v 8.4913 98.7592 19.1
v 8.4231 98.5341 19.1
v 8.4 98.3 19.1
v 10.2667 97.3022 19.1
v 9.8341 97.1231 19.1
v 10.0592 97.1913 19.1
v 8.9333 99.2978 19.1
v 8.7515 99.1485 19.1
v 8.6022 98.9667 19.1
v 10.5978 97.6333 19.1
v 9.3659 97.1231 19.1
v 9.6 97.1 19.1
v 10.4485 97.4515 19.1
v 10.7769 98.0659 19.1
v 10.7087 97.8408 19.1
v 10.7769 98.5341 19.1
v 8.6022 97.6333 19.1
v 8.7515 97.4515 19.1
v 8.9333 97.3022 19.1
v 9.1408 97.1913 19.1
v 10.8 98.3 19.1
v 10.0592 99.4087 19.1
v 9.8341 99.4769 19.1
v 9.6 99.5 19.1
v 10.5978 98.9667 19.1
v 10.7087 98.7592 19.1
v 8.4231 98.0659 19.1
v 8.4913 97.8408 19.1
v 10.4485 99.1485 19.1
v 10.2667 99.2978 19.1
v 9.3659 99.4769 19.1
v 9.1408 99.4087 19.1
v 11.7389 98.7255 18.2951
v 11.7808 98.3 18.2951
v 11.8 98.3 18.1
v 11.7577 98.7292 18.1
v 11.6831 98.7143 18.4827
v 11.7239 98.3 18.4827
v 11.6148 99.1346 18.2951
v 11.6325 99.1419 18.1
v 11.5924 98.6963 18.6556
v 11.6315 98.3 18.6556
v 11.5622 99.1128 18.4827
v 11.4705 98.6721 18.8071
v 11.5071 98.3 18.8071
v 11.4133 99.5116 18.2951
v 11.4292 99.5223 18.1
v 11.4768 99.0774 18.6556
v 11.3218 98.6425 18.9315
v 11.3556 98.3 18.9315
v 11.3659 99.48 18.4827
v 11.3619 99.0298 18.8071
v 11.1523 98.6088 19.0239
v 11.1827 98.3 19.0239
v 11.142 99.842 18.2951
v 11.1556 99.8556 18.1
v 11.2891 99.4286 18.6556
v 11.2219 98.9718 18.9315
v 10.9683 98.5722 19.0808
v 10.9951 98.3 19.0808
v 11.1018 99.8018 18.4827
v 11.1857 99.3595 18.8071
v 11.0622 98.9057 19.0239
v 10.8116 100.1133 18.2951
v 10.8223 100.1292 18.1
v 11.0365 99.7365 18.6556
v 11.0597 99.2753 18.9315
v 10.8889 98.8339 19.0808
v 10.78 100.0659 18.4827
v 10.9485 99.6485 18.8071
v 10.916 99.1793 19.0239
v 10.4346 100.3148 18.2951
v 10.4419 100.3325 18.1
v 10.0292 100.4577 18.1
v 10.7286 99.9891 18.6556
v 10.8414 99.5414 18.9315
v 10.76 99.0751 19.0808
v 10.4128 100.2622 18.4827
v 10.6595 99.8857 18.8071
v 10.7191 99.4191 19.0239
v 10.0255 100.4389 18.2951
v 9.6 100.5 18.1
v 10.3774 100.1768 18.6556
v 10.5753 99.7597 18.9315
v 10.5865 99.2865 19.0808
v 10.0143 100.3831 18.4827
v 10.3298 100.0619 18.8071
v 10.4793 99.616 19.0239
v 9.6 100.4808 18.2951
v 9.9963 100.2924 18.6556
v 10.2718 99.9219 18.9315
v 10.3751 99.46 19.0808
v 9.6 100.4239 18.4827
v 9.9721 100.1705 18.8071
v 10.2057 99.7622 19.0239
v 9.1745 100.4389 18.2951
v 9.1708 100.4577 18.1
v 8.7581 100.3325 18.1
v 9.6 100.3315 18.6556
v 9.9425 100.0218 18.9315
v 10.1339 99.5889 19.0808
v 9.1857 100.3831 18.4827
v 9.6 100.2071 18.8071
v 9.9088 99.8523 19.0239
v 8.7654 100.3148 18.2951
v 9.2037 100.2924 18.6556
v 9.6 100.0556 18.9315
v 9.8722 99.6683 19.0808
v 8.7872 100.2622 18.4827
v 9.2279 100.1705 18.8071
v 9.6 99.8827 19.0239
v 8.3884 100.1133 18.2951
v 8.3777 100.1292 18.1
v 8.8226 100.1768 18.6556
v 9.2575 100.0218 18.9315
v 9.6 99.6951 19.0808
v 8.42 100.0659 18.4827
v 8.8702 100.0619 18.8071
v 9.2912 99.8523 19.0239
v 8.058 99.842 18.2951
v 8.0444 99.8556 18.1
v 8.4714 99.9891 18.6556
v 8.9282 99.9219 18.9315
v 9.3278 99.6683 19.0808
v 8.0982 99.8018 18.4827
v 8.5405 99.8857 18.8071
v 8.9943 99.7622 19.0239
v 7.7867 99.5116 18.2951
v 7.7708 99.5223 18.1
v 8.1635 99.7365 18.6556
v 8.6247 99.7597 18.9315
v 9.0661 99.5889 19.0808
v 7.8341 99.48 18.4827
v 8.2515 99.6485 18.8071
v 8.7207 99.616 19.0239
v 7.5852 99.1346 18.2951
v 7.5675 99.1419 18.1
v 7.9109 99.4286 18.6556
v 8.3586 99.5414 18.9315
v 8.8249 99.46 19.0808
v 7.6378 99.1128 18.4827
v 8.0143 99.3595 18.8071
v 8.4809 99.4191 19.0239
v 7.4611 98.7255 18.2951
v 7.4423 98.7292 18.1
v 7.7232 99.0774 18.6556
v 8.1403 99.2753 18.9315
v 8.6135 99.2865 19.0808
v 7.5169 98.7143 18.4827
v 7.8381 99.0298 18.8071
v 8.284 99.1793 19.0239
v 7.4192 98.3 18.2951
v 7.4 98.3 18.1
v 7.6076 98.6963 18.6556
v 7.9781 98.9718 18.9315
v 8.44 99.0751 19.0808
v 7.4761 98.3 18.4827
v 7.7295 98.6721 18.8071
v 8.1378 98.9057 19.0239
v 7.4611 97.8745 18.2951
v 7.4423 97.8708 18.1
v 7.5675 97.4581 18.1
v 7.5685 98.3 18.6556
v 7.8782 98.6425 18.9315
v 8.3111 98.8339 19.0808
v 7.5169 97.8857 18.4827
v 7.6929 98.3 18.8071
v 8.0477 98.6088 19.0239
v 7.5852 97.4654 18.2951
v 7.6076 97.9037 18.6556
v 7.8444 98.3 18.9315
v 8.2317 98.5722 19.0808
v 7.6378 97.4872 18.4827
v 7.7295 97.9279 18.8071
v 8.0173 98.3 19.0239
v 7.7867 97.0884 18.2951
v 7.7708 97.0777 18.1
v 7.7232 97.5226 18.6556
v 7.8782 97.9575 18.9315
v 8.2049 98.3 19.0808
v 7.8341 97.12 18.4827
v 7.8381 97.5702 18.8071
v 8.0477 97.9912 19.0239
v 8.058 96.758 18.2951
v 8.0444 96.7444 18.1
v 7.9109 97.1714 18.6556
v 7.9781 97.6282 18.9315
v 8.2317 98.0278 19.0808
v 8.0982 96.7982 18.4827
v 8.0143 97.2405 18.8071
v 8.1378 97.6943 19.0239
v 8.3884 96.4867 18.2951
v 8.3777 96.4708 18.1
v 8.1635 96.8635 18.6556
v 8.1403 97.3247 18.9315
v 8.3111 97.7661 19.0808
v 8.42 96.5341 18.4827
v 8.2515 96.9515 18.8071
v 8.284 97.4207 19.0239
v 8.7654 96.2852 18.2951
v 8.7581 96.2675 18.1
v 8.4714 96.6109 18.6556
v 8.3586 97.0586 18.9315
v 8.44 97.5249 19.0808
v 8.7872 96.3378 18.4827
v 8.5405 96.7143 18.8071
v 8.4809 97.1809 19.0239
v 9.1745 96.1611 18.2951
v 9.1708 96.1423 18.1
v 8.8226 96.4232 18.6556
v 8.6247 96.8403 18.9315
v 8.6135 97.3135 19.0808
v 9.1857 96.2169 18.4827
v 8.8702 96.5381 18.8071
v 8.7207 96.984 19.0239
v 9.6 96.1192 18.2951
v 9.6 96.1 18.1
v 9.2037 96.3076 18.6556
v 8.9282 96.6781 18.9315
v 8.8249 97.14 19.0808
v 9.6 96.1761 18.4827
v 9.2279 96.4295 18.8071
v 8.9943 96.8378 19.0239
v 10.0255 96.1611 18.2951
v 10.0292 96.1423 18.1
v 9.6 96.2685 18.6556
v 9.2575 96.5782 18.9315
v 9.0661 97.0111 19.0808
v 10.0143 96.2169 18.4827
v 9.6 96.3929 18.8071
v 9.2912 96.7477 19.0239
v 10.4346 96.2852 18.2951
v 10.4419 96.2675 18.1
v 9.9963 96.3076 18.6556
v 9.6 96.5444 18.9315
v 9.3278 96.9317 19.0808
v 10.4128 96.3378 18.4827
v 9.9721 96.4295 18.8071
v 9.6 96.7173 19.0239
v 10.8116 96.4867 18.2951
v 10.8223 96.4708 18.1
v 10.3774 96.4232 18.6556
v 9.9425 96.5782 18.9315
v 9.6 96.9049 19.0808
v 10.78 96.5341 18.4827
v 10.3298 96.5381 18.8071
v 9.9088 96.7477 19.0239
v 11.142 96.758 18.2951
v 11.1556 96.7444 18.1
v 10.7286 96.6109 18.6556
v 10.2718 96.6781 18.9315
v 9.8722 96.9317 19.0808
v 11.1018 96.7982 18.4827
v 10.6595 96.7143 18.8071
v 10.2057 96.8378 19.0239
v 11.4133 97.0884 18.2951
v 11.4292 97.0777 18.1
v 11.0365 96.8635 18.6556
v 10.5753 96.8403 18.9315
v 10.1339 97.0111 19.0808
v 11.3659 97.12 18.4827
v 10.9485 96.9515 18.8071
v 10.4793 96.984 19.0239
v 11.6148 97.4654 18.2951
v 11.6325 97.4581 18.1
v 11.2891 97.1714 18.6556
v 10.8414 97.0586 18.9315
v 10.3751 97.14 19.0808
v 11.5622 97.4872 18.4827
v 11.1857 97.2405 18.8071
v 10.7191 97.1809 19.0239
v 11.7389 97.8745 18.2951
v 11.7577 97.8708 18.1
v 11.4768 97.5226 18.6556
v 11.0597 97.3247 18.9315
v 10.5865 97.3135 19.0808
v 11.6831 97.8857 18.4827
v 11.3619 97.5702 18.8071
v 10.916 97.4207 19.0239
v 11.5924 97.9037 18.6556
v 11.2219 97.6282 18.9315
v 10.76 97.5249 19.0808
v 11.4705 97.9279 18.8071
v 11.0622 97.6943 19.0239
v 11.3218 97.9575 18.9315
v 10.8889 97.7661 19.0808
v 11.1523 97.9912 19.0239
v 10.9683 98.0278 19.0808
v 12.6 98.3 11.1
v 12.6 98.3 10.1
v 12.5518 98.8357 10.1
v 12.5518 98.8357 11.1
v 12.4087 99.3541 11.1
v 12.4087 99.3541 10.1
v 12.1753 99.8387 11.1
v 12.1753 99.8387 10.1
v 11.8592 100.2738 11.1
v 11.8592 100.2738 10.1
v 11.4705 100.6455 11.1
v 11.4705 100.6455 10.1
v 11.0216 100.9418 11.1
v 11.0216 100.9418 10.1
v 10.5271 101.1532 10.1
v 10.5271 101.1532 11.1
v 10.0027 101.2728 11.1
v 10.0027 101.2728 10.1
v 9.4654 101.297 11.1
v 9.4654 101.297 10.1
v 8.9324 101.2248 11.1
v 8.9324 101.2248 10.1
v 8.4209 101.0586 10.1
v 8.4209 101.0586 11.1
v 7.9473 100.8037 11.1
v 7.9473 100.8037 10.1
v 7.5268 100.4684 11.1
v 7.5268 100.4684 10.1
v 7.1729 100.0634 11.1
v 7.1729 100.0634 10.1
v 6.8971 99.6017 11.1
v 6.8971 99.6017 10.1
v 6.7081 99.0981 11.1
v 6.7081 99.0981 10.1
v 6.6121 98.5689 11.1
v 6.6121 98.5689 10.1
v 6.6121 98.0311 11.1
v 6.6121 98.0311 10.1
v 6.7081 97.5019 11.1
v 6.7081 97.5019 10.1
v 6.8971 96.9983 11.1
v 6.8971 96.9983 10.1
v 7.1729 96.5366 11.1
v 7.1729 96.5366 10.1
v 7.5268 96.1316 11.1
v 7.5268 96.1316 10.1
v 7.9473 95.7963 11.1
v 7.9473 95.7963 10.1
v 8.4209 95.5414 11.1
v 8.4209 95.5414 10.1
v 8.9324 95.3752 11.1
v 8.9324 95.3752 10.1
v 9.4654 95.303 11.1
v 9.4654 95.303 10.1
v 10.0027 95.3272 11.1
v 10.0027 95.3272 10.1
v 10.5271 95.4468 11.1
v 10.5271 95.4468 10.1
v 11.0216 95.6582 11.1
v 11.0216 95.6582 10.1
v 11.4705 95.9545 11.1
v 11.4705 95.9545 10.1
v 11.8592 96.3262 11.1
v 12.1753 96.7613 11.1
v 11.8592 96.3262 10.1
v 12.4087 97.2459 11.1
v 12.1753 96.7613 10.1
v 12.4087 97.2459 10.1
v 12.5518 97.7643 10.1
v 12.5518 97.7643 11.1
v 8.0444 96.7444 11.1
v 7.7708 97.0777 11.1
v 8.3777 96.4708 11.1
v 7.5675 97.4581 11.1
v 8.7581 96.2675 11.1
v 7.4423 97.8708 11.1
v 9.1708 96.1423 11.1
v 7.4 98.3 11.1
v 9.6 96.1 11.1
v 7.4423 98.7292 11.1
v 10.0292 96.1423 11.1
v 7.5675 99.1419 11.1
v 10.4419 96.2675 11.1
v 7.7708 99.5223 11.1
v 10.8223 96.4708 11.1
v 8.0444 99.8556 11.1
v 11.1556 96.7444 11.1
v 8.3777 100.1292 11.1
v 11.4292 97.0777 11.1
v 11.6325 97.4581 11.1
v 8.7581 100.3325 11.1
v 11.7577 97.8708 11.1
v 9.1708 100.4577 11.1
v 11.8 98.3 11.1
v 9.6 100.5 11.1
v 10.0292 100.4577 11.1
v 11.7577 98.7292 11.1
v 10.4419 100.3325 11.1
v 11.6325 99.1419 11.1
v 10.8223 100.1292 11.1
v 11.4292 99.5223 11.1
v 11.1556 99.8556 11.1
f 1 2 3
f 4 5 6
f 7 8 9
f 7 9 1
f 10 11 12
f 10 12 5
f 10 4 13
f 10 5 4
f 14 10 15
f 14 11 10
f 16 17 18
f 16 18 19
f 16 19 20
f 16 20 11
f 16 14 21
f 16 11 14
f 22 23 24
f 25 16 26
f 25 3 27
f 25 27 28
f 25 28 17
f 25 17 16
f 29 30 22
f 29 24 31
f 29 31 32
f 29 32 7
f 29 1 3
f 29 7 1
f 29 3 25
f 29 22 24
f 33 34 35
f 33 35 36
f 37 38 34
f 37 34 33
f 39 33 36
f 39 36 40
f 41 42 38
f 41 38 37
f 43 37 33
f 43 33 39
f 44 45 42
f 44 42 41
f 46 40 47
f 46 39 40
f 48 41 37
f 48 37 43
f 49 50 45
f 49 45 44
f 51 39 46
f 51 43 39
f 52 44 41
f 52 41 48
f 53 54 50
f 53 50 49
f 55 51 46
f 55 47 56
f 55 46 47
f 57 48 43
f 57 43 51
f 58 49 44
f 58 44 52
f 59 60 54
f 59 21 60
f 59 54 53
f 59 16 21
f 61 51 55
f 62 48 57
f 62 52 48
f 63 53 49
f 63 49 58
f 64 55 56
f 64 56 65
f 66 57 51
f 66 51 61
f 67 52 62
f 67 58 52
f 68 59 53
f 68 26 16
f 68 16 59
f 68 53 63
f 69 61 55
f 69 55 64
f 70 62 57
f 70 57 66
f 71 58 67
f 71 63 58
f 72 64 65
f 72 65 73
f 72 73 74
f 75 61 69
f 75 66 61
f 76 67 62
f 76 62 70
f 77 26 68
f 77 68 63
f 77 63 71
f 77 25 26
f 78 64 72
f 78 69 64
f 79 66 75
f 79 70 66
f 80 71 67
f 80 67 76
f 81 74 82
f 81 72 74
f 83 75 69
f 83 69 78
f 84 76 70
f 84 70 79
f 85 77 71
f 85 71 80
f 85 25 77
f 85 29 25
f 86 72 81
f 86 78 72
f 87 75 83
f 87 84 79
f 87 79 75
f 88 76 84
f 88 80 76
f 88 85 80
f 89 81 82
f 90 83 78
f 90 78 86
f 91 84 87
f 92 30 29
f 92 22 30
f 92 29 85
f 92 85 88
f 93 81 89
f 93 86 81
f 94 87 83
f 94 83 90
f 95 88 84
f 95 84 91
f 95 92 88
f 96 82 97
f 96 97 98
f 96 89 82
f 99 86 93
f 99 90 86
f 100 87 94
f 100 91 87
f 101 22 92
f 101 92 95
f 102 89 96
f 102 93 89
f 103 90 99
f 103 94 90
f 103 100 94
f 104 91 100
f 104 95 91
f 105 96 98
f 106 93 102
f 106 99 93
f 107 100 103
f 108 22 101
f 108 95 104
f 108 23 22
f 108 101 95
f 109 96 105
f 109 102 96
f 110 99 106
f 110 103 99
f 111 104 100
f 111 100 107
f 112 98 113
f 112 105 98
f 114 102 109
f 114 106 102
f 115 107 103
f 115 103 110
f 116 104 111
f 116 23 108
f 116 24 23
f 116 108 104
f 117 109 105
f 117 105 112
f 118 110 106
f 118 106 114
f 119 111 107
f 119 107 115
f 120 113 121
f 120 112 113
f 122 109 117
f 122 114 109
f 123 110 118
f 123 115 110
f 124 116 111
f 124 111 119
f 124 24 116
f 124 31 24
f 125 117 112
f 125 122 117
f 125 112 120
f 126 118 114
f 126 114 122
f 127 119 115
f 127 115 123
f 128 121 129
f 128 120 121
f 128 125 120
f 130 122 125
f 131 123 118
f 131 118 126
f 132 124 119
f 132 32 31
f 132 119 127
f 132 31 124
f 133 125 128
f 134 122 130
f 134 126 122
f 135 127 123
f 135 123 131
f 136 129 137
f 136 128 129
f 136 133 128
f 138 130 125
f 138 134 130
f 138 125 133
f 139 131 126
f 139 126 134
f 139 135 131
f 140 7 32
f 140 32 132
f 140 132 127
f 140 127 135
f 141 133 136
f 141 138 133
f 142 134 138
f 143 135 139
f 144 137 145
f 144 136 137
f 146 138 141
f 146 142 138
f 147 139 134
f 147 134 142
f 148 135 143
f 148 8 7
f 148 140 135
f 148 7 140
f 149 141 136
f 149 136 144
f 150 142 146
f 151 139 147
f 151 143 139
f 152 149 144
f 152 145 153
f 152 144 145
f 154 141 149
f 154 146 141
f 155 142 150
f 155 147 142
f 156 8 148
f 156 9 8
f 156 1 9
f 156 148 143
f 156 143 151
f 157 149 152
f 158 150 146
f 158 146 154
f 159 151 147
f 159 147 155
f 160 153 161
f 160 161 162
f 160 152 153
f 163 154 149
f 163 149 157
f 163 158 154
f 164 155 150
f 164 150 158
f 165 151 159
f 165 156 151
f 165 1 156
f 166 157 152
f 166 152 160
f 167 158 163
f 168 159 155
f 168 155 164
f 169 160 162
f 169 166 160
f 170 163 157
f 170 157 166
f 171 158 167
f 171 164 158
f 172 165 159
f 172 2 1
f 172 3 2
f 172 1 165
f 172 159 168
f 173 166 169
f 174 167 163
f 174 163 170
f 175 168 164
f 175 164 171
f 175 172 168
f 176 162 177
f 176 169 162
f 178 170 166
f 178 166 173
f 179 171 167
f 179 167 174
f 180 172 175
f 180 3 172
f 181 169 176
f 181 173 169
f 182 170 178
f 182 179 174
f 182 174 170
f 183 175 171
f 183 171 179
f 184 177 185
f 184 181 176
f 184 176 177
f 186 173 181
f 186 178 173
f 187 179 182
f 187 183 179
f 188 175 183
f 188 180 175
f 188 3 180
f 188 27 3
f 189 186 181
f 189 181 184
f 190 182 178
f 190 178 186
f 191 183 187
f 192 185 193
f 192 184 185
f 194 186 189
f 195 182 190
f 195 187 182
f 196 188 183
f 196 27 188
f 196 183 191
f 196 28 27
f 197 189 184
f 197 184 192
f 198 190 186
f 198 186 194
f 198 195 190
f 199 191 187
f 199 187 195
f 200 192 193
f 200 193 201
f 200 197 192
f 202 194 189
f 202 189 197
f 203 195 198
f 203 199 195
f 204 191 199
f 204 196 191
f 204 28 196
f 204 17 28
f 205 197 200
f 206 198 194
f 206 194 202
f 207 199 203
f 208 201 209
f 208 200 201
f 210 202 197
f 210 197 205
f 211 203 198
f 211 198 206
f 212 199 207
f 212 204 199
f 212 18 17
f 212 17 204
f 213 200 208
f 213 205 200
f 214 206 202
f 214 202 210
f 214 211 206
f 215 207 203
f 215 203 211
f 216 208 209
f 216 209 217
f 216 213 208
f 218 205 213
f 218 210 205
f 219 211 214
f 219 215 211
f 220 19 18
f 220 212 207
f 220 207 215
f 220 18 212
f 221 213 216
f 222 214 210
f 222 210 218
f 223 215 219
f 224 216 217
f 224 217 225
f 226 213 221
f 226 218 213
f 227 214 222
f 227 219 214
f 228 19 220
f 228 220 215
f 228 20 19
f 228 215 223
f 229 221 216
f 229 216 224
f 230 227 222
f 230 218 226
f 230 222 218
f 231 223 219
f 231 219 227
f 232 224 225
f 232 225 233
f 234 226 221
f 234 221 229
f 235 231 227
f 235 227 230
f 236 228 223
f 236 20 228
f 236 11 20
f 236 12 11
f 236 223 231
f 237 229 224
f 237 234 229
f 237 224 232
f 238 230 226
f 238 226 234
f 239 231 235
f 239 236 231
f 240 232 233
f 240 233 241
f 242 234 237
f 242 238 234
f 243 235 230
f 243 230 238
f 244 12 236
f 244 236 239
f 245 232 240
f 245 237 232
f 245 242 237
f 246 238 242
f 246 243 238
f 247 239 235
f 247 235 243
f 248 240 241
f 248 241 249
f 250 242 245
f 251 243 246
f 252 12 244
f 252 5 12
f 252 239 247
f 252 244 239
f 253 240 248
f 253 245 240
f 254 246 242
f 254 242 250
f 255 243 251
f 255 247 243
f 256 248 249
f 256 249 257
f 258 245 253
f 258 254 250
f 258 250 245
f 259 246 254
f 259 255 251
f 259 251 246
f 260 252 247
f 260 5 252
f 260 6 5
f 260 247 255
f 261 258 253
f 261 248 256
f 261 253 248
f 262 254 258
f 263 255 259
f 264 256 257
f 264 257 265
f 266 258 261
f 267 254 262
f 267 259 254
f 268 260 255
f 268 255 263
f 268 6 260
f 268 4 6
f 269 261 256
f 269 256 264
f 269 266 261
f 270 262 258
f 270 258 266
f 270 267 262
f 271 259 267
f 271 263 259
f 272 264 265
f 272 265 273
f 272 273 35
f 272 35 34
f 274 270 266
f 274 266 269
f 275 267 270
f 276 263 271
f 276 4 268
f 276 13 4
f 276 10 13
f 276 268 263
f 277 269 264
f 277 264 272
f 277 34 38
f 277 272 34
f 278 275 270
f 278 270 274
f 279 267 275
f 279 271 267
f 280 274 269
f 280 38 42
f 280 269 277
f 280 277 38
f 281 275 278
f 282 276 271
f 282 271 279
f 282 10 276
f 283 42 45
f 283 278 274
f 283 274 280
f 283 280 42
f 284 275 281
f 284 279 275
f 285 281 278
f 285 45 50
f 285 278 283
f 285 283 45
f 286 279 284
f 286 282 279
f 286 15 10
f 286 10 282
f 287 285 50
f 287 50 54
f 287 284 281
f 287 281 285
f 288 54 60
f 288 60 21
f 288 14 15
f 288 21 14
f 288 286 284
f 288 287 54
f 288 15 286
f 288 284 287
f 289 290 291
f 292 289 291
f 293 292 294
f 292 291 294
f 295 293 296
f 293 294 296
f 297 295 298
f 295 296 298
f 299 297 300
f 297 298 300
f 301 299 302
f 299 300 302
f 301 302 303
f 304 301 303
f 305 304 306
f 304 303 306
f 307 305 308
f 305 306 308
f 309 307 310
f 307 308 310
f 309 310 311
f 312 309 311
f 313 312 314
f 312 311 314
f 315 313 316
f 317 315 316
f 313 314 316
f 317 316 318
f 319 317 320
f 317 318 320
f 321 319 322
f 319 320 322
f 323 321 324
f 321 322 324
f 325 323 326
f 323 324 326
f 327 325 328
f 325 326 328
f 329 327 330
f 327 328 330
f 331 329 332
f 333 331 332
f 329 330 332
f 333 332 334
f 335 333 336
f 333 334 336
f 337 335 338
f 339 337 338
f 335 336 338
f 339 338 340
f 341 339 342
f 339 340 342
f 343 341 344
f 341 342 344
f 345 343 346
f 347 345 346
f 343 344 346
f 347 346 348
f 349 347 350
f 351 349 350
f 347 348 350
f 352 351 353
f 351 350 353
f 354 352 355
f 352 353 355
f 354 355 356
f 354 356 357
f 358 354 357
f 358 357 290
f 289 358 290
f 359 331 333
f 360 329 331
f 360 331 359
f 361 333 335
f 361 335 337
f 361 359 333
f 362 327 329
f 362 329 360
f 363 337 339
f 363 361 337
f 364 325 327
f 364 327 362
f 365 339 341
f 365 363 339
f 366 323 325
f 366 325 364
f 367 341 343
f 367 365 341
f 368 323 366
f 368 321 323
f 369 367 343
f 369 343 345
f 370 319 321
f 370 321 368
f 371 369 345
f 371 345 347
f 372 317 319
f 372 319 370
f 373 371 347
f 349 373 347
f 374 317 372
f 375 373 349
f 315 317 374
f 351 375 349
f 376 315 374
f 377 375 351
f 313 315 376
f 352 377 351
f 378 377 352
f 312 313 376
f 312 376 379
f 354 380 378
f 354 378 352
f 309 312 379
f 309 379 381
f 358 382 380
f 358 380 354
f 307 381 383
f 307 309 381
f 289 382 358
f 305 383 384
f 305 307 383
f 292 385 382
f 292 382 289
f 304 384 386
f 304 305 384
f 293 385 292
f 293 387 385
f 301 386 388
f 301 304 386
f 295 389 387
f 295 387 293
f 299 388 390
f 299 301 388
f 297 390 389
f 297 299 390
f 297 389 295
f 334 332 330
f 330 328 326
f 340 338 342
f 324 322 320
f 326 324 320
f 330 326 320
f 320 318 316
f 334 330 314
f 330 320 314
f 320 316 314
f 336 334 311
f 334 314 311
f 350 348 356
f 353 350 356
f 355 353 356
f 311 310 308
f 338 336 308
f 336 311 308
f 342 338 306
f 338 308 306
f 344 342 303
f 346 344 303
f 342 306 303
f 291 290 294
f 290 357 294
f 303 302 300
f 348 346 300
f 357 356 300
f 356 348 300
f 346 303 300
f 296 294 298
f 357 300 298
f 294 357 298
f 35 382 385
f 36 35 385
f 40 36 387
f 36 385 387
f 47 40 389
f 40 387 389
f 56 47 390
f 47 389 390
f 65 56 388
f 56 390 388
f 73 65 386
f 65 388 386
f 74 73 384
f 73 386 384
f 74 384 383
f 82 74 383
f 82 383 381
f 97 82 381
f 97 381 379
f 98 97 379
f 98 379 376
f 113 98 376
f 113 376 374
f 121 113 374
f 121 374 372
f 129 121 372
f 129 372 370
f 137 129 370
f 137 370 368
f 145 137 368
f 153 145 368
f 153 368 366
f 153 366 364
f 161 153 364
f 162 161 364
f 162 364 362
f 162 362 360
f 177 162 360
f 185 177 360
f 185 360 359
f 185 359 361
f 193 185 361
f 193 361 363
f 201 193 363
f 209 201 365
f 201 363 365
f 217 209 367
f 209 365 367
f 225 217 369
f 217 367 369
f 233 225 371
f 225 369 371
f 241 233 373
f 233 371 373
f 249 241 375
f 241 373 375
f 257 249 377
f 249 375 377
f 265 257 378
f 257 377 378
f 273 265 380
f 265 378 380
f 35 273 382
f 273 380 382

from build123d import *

# Parameters (mm, degrees)
CYLINDER019_R     = 2.2
CYLINDER019_DEPTH = 9
CYLINDER021_R     = 3
CYLINDER021_DEPTH = 1
FILLET_R          = 1


with BuildPart() as onoff_button_c:
    # Cylinder019 → Cylinder019 (new body)
    with BuildSketch(Plane(origin=(9.6, 98.3, 10.1), x_dir=(1, 0, 0), z_dir=(0, 0, 1))):
        Circle(CYLINDER019_R)
    extrude(amount=CYLINDER019_DEPTH)


with BuildPart() as onoff_button:
    # Cylinder021 → Cylinder021 (new body)
    with BuildSketch(Plane(origin=(9.6, 98.3, 10.1), x_dir=(1, 0, 0), z_dir=(0, 0, 1))):
        Circle(CYLINDER021_R)
    extrude(amount=CYLINDER021_DEPTH)

    # Fusion032: union onoff_button_c
    add(onoff_button_c.part)

    # Fillet
    fillet_edges = [onoff_button.edges().sort_by_distance(p)[0] for p in [
        (7.4, 98.3, 19.1),
    ]]
    fillet(fillet_edges, radius=FILLET_R)


solid = onoff_button.part
